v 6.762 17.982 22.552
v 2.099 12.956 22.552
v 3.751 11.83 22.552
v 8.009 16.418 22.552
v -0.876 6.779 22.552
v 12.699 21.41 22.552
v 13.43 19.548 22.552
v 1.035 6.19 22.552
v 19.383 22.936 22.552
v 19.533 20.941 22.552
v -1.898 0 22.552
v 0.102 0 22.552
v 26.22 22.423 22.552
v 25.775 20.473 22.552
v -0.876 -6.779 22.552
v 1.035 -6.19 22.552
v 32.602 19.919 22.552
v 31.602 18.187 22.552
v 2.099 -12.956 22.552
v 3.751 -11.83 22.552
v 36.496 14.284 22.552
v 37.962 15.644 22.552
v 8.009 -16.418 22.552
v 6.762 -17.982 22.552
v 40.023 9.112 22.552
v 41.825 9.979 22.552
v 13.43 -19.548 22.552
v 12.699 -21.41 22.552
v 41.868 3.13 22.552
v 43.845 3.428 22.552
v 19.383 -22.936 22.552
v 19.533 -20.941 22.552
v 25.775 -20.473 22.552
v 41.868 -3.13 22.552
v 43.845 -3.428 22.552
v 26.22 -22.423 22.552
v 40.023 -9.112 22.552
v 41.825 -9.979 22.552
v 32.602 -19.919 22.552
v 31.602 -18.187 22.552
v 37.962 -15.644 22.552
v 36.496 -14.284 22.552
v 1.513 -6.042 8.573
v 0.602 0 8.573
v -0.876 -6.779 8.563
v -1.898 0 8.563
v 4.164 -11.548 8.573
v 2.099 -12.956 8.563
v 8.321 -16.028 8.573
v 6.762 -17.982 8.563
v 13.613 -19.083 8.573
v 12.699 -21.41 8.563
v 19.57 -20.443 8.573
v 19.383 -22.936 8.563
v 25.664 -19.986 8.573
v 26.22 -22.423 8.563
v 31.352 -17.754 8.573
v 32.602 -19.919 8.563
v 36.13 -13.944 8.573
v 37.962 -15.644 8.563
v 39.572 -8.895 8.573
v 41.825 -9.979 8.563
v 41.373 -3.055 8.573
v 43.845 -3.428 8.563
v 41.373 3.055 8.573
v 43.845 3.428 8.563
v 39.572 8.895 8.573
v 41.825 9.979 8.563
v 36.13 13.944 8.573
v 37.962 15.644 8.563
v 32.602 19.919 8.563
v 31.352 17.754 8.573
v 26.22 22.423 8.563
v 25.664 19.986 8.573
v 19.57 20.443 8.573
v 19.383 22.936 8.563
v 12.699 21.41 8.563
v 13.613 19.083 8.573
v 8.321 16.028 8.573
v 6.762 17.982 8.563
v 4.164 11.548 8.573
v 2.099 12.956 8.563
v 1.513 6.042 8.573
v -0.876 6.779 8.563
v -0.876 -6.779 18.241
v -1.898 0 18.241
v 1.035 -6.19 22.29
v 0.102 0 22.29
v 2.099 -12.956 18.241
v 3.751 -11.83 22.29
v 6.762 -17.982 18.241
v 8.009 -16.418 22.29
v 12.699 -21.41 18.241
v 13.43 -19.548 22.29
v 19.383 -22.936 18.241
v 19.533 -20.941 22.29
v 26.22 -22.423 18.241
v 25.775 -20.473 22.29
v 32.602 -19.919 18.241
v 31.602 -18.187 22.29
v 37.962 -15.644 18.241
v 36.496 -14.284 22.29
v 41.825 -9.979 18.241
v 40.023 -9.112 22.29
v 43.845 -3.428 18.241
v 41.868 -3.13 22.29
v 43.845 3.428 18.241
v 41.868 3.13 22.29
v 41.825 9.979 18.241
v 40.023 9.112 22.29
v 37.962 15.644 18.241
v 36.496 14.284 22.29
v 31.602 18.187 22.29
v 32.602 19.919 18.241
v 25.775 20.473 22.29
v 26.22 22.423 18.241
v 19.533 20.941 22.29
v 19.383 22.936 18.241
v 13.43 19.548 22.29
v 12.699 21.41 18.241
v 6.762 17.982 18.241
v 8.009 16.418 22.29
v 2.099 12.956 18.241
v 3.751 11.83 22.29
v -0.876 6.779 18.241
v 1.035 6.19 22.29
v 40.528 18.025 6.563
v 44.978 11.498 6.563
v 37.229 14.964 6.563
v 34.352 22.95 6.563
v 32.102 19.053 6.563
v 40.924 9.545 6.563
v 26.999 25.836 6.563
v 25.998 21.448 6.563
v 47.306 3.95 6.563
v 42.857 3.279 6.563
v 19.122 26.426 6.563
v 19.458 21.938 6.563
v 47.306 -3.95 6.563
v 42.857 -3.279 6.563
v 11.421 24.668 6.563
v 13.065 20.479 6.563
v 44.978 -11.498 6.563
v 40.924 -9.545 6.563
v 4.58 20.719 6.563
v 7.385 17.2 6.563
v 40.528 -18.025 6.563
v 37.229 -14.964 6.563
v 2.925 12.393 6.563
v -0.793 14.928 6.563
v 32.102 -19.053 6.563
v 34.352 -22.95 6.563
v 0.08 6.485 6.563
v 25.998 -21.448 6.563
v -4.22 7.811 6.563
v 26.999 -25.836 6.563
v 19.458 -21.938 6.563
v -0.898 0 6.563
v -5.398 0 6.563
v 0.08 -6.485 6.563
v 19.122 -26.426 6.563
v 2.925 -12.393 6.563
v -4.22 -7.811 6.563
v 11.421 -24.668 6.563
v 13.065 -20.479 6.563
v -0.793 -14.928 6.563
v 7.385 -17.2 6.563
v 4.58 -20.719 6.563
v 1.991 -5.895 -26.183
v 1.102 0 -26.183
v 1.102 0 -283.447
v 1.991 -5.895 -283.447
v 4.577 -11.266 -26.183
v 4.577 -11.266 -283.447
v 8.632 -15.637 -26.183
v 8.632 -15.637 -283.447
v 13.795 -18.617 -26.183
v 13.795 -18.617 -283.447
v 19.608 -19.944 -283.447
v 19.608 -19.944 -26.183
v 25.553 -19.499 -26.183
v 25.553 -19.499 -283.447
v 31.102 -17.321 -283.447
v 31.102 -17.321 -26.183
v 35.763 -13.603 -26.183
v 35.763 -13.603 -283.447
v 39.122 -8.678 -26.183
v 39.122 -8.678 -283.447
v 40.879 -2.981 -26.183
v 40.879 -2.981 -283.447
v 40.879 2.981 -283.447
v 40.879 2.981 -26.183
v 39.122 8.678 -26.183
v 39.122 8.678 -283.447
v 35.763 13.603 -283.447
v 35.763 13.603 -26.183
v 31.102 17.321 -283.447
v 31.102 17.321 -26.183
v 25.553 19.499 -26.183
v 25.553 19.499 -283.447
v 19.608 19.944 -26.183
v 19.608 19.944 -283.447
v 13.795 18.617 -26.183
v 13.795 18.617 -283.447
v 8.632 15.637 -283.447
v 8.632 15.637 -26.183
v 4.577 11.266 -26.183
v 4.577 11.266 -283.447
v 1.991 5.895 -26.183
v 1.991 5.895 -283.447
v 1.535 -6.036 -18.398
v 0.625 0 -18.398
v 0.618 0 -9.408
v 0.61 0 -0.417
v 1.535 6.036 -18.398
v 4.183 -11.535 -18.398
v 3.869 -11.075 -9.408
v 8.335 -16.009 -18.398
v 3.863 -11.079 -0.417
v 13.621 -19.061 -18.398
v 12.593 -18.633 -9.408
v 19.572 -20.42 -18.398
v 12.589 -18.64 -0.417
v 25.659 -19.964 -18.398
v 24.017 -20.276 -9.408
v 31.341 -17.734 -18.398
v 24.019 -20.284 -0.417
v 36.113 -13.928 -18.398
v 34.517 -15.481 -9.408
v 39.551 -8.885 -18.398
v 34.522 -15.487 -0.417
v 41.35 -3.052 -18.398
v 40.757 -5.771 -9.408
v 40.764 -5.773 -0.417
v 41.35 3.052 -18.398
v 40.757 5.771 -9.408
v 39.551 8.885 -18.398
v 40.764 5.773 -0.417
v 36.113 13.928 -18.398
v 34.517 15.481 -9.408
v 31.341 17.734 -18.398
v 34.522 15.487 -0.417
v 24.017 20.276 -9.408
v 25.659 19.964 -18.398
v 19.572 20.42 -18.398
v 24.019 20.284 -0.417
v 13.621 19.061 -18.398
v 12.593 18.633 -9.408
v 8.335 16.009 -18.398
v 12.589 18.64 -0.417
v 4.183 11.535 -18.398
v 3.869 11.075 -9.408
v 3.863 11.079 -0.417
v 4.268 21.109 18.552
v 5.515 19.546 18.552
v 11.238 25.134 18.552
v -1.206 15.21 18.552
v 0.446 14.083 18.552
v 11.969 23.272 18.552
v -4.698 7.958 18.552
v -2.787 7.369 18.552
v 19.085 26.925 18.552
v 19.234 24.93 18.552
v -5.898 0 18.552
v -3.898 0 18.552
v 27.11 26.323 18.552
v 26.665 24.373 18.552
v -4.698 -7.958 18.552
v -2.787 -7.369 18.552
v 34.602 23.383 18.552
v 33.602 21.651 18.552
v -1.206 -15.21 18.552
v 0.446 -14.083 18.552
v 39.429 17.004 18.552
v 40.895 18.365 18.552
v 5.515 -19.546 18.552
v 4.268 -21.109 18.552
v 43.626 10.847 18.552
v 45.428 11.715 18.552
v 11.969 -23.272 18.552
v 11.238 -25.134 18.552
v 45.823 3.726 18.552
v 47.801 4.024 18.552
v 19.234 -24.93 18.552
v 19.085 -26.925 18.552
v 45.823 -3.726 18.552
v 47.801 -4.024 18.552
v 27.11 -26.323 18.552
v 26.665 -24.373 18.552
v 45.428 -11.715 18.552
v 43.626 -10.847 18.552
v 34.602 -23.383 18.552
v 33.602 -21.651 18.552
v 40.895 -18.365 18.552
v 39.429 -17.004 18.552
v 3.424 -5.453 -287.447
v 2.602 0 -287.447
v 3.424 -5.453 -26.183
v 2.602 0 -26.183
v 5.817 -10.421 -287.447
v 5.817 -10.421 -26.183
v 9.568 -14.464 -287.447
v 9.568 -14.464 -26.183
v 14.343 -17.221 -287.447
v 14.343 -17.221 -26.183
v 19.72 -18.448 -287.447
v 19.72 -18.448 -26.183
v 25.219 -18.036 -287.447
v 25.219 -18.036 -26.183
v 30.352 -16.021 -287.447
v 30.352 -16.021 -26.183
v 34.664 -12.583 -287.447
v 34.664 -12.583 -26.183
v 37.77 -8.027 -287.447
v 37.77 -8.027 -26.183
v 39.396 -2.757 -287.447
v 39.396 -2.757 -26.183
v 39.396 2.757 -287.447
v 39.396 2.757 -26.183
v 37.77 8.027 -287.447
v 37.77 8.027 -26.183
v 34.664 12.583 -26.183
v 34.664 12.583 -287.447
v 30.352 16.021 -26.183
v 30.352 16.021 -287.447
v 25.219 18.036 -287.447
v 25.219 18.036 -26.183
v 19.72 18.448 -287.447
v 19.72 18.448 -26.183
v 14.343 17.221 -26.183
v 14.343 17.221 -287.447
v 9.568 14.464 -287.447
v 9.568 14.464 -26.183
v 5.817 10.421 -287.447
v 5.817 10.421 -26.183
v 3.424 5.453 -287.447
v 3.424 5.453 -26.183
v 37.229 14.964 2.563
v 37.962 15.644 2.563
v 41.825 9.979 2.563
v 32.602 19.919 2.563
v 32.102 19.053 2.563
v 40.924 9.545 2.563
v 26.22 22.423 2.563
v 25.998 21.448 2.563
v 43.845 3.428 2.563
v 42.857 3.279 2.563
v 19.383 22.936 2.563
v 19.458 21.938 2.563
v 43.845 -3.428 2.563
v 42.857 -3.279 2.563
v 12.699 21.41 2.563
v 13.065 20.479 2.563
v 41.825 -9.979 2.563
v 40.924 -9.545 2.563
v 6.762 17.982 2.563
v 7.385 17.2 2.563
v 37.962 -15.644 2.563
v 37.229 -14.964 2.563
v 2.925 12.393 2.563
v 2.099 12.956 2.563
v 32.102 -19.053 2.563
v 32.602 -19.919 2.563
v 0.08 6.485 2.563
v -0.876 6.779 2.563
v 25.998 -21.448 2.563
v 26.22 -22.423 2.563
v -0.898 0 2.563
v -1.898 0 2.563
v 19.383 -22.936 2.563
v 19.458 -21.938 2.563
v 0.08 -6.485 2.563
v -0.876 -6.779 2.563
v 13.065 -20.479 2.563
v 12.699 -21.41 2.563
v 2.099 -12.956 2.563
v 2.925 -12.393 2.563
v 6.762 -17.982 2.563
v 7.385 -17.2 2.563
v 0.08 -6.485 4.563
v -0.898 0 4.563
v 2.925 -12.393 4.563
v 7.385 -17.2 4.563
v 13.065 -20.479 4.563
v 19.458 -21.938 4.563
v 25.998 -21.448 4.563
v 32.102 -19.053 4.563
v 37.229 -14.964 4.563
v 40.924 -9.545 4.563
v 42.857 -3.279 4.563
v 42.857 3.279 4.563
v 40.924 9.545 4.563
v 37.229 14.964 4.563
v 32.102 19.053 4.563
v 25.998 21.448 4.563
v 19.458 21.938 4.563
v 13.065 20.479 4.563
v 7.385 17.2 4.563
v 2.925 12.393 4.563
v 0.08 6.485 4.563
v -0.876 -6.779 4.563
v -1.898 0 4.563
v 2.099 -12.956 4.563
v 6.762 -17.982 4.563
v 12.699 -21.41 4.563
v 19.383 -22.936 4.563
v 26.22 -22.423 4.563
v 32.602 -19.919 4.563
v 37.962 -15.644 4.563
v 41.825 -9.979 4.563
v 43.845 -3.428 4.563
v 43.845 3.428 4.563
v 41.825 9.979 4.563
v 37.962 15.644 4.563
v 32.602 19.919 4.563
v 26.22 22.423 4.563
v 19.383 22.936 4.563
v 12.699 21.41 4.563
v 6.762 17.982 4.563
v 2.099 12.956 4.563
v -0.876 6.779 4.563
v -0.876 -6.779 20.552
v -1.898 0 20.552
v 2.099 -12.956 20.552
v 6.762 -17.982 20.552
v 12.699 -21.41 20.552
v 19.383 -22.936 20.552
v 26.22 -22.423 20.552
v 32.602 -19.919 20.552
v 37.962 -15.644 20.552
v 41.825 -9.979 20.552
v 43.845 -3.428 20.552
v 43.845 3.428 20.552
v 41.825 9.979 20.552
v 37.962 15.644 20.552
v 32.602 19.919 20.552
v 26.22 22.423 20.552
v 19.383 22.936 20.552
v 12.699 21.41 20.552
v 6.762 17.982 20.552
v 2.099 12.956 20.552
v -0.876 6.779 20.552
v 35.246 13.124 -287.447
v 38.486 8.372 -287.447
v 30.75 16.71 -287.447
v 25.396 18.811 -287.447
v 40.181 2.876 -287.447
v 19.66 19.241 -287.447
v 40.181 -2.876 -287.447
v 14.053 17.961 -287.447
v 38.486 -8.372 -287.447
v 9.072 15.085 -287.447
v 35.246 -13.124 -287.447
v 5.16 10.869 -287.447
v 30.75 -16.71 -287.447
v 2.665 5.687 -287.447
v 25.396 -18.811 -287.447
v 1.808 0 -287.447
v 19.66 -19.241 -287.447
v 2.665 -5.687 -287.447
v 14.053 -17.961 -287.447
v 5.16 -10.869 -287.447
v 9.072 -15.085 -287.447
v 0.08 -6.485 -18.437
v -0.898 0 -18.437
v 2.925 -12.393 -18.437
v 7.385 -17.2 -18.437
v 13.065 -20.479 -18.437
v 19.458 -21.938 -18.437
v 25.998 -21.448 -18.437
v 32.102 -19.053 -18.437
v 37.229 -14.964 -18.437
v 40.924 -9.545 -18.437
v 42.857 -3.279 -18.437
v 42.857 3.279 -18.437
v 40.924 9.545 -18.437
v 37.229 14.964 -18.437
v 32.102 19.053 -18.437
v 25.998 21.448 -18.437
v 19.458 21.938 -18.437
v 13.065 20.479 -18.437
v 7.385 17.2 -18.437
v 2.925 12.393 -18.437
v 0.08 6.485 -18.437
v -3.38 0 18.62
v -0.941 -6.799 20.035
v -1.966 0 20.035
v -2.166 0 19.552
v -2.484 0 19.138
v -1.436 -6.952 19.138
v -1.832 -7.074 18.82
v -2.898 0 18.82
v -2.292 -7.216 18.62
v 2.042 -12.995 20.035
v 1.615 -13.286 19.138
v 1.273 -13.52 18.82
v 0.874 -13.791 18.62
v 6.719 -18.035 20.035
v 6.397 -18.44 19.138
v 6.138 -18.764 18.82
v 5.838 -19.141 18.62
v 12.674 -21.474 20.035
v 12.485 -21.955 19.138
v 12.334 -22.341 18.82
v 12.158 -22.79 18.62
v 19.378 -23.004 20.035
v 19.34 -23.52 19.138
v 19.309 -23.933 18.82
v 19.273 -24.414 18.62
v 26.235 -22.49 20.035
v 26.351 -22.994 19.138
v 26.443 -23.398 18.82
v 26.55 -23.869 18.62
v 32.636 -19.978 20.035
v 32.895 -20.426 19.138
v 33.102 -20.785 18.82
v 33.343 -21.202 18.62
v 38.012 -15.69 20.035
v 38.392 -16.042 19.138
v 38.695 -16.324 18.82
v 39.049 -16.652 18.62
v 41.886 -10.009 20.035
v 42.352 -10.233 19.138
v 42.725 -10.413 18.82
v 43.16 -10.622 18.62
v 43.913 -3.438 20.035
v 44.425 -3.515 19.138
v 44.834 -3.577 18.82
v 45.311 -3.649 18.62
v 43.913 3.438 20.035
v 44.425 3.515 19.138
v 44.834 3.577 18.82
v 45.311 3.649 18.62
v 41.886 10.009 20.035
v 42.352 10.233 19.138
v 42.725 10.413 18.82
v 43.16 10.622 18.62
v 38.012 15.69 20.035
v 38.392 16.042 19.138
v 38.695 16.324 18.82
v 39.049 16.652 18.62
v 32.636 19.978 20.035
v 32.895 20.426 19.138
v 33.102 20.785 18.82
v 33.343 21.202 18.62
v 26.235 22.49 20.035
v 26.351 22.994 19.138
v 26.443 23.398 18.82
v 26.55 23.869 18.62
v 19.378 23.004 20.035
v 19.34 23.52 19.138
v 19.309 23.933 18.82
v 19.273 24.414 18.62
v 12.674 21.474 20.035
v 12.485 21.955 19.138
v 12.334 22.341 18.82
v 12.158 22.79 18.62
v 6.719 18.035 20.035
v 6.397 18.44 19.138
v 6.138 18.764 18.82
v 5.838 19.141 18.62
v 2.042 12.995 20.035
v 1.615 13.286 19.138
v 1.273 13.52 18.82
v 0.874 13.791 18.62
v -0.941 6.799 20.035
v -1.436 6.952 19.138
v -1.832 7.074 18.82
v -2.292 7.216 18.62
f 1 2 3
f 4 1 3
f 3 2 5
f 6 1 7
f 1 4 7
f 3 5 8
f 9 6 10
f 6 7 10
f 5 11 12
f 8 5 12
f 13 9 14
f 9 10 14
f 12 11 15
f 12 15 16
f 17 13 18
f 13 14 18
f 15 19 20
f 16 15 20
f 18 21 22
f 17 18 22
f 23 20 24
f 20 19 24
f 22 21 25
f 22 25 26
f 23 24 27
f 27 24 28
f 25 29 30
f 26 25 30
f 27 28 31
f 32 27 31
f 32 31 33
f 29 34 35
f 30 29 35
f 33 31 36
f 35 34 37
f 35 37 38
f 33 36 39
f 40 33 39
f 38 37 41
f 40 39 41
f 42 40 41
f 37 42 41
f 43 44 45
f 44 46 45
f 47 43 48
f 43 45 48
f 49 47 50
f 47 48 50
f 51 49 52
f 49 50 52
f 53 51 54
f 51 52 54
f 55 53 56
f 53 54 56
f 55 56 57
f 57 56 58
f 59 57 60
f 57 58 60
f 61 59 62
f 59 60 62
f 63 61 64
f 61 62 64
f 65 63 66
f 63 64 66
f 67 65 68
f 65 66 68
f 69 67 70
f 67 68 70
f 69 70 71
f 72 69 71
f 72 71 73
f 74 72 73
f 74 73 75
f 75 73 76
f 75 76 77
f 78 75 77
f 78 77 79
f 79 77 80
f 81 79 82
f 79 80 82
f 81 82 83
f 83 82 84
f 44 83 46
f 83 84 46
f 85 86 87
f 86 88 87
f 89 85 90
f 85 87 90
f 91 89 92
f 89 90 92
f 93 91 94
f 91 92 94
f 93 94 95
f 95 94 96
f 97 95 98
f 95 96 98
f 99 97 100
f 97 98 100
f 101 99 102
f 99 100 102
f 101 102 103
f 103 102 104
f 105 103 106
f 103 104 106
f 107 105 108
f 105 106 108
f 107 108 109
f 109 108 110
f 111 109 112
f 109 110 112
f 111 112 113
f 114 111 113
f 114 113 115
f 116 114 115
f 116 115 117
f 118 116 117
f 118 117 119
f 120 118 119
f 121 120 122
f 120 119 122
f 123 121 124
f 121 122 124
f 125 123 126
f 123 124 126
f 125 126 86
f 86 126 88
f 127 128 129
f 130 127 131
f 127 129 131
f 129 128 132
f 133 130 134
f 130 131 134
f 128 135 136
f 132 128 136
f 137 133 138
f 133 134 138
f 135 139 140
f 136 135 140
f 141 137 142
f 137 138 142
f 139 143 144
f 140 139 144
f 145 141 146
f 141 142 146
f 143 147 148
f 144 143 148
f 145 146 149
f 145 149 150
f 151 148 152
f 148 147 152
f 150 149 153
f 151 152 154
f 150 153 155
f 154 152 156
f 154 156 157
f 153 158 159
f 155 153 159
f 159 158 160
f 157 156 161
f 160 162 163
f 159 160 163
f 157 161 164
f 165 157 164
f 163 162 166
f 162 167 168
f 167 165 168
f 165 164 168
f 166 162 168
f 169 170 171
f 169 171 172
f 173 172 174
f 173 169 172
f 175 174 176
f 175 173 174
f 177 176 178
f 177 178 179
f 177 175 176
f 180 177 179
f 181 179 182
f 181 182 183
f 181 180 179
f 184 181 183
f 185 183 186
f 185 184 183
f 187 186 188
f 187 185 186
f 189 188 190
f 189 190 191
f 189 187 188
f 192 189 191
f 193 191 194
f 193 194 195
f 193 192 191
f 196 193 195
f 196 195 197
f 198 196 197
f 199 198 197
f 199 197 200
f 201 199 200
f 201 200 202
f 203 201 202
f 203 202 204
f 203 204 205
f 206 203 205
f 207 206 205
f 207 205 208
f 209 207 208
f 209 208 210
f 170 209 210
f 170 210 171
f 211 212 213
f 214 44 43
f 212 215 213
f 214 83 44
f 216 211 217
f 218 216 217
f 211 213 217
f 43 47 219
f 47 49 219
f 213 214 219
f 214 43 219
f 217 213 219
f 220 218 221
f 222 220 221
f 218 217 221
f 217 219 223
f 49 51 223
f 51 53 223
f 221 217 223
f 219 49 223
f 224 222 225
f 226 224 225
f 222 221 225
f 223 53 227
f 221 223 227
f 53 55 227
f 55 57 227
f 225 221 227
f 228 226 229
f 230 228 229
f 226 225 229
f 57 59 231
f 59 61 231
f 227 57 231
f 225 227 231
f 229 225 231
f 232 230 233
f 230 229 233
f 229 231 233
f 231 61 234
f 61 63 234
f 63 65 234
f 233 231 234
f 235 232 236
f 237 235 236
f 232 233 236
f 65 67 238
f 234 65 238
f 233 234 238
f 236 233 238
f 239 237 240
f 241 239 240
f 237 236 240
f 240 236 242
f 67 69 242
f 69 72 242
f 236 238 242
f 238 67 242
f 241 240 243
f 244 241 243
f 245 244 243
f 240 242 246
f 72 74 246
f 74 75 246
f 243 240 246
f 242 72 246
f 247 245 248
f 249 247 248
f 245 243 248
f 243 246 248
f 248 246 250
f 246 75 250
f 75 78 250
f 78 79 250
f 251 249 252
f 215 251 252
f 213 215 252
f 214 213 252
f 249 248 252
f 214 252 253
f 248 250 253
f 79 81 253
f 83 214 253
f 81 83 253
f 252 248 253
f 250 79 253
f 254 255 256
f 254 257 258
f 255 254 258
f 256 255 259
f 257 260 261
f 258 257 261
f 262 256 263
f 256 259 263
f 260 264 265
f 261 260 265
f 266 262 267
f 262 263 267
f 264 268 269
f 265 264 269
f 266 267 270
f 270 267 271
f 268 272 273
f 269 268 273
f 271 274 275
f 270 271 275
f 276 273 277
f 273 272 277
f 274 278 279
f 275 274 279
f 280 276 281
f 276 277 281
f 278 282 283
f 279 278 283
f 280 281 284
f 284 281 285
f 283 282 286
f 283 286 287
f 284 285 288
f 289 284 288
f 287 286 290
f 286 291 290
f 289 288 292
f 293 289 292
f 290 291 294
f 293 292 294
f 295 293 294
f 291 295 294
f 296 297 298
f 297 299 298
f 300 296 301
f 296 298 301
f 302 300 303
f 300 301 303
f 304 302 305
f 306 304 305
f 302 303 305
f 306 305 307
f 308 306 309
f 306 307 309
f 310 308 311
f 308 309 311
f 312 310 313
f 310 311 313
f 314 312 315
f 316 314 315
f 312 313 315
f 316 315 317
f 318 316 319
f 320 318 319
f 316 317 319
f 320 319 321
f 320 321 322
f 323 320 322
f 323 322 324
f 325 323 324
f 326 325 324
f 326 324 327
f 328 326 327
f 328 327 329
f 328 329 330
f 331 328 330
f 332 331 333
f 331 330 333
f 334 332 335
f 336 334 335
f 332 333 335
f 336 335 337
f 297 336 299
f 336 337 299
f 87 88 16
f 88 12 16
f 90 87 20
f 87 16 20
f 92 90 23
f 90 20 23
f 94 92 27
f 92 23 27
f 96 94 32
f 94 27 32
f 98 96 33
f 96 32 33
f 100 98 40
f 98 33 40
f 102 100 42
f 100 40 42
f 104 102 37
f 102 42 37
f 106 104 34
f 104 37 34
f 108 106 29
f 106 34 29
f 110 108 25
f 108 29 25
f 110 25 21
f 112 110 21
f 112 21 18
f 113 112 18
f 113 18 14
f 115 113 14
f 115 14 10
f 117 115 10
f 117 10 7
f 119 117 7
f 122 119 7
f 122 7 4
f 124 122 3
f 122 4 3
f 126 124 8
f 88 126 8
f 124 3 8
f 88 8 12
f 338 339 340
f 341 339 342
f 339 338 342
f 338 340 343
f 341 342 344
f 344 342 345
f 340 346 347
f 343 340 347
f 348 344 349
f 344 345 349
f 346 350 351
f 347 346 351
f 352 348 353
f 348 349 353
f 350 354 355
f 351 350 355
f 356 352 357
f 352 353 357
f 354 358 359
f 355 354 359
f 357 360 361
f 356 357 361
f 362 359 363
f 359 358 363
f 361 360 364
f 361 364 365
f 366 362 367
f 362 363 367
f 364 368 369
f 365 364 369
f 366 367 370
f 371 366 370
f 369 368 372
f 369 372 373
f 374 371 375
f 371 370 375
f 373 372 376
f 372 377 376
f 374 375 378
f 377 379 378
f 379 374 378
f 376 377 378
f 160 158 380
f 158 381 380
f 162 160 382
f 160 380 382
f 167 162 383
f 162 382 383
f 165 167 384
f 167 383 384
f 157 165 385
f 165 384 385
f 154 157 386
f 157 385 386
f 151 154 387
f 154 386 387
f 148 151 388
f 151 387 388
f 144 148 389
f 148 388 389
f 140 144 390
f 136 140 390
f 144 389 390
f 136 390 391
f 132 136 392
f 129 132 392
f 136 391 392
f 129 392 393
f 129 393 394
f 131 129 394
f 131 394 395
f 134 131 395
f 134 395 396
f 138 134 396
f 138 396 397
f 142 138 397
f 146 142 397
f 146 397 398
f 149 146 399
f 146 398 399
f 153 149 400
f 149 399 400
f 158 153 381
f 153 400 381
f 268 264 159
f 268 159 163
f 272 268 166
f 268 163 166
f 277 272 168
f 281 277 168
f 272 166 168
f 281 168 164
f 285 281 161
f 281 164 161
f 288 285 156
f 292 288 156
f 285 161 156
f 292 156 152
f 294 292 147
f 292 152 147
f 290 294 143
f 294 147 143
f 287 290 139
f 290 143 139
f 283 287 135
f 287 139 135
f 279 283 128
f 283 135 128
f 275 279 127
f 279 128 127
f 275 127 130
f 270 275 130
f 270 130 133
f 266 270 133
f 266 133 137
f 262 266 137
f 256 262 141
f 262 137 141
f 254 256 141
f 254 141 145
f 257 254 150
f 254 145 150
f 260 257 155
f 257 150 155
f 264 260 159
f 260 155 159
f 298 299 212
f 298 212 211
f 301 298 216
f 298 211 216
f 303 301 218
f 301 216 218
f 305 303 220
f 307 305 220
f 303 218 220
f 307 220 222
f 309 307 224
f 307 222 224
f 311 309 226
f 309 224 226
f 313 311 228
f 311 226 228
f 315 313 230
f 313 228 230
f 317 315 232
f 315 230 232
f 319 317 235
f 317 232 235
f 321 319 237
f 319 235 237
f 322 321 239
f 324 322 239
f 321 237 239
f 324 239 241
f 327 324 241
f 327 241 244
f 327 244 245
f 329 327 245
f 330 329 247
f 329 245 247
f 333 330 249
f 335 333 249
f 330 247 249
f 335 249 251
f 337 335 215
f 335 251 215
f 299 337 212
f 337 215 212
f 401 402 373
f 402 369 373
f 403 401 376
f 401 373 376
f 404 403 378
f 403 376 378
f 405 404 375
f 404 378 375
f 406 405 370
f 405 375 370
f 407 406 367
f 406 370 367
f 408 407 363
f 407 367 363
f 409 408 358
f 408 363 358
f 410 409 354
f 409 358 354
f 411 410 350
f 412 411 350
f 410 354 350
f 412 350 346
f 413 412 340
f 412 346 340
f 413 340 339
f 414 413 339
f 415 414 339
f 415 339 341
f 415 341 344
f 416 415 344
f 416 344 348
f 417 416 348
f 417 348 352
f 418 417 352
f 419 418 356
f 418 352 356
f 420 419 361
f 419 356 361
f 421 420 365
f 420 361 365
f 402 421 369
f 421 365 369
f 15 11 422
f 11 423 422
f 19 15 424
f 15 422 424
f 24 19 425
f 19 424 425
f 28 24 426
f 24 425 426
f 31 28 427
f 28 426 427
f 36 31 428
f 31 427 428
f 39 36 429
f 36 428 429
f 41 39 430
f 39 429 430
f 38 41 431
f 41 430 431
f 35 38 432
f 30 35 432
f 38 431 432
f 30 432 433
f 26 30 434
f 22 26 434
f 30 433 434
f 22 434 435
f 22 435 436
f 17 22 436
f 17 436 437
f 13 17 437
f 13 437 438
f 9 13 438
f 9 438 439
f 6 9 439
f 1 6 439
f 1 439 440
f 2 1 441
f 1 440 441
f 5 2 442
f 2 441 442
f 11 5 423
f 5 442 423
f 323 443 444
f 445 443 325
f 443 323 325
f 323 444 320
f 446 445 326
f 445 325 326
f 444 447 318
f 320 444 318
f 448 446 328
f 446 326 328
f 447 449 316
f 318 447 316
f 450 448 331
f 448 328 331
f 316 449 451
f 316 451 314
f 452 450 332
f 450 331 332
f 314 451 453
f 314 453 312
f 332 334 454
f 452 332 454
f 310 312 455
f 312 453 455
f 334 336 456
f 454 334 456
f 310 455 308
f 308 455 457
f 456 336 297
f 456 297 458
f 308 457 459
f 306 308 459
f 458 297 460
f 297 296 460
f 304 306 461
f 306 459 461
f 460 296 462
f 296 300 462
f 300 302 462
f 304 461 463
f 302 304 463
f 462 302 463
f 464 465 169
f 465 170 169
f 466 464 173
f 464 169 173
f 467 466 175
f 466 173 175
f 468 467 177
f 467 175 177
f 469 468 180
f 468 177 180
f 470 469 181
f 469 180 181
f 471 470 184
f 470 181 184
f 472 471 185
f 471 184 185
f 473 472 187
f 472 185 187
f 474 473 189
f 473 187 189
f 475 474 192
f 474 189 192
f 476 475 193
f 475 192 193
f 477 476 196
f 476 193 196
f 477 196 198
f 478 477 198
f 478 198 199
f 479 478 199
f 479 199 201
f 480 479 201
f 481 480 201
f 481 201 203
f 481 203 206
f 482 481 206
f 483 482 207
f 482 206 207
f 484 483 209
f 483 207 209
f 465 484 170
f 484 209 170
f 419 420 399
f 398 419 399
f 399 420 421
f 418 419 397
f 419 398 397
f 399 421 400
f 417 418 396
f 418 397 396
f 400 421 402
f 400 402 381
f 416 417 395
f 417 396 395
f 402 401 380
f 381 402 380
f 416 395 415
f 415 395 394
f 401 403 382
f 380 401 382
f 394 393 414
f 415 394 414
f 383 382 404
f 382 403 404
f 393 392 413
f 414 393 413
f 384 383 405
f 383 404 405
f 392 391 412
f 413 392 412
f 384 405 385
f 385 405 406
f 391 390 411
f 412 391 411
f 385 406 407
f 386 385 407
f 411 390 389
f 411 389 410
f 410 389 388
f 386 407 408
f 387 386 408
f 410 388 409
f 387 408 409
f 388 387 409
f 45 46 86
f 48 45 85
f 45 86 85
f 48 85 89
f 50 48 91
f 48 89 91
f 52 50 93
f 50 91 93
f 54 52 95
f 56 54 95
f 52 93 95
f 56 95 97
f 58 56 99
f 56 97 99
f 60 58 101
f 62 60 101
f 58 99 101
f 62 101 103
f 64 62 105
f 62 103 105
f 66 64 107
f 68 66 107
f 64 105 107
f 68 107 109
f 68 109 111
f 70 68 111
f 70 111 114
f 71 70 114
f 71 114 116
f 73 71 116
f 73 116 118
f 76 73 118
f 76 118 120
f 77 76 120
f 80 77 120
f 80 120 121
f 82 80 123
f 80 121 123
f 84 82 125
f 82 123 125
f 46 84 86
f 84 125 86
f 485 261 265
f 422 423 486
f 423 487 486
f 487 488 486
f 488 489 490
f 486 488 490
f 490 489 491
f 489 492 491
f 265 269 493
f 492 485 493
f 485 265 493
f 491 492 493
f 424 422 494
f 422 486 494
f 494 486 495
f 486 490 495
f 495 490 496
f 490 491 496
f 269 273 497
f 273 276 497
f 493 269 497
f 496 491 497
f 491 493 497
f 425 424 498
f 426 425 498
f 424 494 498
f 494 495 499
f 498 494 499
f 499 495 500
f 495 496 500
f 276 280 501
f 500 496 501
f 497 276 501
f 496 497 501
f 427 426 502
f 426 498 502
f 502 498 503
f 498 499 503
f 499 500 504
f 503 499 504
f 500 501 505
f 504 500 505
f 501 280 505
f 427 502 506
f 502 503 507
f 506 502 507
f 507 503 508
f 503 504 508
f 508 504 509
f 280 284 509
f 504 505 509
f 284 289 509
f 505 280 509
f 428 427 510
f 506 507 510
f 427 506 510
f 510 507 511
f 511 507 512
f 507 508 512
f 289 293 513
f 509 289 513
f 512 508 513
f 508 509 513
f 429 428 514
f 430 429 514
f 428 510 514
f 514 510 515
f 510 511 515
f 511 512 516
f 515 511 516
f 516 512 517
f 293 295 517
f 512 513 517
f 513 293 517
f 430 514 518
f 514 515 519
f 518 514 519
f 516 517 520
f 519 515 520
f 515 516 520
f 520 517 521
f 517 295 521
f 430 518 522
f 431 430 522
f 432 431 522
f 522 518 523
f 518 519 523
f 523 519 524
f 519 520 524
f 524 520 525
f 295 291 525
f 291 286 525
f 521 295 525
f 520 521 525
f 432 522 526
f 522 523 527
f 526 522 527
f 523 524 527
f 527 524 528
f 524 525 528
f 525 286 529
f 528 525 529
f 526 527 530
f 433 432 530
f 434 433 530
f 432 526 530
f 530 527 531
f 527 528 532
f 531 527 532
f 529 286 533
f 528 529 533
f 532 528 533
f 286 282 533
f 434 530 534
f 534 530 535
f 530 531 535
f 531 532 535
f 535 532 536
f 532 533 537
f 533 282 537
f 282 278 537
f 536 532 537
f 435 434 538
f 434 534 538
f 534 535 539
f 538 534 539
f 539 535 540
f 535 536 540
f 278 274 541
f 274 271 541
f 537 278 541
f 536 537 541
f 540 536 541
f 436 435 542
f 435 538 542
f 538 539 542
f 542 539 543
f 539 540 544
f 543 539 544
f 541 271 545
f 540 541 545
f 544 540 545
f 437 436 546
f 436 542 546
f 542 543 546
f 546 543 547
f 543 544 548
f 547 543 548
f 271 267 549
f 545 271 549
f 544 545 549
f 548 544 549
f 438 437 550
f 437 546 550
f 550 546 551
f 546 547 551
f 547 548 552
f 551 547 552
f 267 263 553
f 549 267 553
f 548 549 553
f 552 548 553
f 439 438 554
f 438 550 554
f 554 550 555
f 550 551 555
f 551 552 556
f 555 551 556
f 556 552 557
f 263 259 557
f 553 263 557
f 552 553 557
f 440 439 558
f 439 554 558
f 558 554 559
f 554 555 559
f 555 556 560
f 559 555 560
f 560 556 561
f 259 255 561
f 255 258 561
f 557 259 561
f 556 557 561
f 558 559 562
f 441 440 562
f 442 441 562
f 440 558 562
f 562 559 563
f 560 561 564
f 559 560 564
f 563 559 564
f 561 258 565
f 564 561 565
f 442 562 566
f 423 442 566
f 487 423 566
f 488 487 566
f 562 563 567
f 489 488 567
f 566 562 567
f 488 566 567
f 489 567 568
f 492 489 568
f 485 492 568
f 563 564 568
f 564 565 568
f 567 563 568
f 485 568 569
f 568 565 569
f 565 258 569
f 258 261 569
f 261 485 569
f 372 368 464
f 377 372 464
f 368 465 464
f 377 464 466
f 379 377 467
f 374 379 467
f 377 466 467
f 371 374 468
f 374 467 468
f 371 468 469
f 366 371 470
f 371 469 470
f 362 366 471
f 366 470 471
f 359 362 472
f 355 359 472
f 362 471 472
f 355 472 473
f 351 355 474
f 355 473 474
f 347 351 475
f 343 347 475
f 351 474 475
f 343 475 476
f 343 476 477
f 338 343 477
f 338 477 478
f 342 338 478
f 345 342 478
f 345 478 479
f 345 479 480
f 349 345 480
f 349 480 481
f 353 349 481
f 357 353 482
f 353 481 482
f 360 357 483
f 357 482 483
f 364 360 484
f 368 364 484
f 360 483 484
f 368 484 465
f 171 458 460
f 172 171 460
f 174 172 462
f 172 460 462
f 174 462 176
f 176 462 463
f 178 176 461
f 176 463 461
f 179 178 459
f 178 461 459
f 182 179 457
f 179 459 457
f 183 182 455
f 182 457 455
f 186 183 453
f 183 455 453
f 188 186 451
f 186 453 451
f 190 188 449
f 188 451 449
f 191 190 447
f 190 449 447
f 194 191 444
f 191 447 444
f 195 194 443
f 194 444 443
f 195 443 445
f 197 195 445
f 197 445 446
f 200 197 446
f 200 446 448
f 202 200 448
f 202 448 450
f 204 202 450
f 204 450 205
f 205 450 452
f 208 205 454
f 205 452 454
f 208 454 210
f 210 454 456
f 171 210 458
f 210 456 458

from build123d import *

# Parameters (mm, degrees)
F0_W     = 1.5
F0_H     = 6.264
F2_DEPTH = 255
F3_SIZE2 = 0.7053079228
F3_SIZE  = 4


with BuildPart() as f1:
    # F0 (on Front) → F1 (revolve)
    with BuildSketch(Plane.XZ):
        with BuildLine():
            Line((-1.8977640684, 2.5627018091), (-0.8977640684, 2.5627018091))
            Line((-0.8977640684, 2.5627018091), (-0.8977640684, -18.4372981909))
            Line((-0.8977640684, -18.4372981909), (1.1022359316, -26.1832648833))
            Line((1.1022359316, -26.1832648833), (2.6022359316, -26.1832648833))
            Line((2.6022359316, -26.1832648833), (0.6253340279, -18.3980558312))
            Line((0.6253340279, -18.3980558312), (0.6022359316, 8.5731884591))
            Line((0.6022359316, 8.5731884591), (-1.8977640684, 8.5627018091))
            Line((-1.8977640684, 8.5627018091), (-1.8977640684, 18.240797309))
            Line((-1.8977640684, 18.240797309), (0.1022359316, 22.2902958969))
            Line((0.1022359316, 22.2902958969), (0.1022359316, 22.5522806174))
            Line((0.1022359316, 22.5522806174), (-1.8977640684, 22.5522806174))
            Line((-1.8977640684, 22.5522806174), (-1.8977640684, 20.5522806174))
            ThreePointArc((-1.8977640684, 20.5522806174), (-2.483550506, 19.138067055), (-3.8977640684, 18.5522806174))
            Line((-3.8977640684, 18.5522806174), (-5.8977640684, 18.5522806174))
            Line((-5.8977640684, 18.5522806174), (-5.3977640684, 6.5627018091))
            Line((-5.3977640684, 6.5627018091), (-0.8977640684, 6.5627018091))
            Line((-0.8977640684, 6.5627018091), (-0.8977640684, 4.5627018091))
            Line((-0.8977640684, 4.5627018091), (-1.8977640684, 4.5627018091))
            Line((-1.8977640684, 4.5627018091), (-1.8977640684, 2.5627018091))
        make_face()
        with Locations((1.8522359316, -29.3152648833)):
            Rectangle(F0_W, F0_H)
    revolve(axis=Axis((21.1022359316, 0, -25.8119600499), (0, 0, 1)))

    # F2 (add): a face of the model
    f2_faces = [f1.faces().sort_by_distance(p)[0] for p in [
        (40.5365505067, 0, -32.4472648833),
    ]]
    extrude(f2_faces, amount=F2_DEPTH)

    # F3
    f3_edges = [f1.edges().sort_by_distance(p)[0] for p in [
        (41.102236, 0, -287.447265),
    ]]
    chamfer(f3_edges, length=F3_SIZE, length2=F3_SIZE2)


solid = f1.part
